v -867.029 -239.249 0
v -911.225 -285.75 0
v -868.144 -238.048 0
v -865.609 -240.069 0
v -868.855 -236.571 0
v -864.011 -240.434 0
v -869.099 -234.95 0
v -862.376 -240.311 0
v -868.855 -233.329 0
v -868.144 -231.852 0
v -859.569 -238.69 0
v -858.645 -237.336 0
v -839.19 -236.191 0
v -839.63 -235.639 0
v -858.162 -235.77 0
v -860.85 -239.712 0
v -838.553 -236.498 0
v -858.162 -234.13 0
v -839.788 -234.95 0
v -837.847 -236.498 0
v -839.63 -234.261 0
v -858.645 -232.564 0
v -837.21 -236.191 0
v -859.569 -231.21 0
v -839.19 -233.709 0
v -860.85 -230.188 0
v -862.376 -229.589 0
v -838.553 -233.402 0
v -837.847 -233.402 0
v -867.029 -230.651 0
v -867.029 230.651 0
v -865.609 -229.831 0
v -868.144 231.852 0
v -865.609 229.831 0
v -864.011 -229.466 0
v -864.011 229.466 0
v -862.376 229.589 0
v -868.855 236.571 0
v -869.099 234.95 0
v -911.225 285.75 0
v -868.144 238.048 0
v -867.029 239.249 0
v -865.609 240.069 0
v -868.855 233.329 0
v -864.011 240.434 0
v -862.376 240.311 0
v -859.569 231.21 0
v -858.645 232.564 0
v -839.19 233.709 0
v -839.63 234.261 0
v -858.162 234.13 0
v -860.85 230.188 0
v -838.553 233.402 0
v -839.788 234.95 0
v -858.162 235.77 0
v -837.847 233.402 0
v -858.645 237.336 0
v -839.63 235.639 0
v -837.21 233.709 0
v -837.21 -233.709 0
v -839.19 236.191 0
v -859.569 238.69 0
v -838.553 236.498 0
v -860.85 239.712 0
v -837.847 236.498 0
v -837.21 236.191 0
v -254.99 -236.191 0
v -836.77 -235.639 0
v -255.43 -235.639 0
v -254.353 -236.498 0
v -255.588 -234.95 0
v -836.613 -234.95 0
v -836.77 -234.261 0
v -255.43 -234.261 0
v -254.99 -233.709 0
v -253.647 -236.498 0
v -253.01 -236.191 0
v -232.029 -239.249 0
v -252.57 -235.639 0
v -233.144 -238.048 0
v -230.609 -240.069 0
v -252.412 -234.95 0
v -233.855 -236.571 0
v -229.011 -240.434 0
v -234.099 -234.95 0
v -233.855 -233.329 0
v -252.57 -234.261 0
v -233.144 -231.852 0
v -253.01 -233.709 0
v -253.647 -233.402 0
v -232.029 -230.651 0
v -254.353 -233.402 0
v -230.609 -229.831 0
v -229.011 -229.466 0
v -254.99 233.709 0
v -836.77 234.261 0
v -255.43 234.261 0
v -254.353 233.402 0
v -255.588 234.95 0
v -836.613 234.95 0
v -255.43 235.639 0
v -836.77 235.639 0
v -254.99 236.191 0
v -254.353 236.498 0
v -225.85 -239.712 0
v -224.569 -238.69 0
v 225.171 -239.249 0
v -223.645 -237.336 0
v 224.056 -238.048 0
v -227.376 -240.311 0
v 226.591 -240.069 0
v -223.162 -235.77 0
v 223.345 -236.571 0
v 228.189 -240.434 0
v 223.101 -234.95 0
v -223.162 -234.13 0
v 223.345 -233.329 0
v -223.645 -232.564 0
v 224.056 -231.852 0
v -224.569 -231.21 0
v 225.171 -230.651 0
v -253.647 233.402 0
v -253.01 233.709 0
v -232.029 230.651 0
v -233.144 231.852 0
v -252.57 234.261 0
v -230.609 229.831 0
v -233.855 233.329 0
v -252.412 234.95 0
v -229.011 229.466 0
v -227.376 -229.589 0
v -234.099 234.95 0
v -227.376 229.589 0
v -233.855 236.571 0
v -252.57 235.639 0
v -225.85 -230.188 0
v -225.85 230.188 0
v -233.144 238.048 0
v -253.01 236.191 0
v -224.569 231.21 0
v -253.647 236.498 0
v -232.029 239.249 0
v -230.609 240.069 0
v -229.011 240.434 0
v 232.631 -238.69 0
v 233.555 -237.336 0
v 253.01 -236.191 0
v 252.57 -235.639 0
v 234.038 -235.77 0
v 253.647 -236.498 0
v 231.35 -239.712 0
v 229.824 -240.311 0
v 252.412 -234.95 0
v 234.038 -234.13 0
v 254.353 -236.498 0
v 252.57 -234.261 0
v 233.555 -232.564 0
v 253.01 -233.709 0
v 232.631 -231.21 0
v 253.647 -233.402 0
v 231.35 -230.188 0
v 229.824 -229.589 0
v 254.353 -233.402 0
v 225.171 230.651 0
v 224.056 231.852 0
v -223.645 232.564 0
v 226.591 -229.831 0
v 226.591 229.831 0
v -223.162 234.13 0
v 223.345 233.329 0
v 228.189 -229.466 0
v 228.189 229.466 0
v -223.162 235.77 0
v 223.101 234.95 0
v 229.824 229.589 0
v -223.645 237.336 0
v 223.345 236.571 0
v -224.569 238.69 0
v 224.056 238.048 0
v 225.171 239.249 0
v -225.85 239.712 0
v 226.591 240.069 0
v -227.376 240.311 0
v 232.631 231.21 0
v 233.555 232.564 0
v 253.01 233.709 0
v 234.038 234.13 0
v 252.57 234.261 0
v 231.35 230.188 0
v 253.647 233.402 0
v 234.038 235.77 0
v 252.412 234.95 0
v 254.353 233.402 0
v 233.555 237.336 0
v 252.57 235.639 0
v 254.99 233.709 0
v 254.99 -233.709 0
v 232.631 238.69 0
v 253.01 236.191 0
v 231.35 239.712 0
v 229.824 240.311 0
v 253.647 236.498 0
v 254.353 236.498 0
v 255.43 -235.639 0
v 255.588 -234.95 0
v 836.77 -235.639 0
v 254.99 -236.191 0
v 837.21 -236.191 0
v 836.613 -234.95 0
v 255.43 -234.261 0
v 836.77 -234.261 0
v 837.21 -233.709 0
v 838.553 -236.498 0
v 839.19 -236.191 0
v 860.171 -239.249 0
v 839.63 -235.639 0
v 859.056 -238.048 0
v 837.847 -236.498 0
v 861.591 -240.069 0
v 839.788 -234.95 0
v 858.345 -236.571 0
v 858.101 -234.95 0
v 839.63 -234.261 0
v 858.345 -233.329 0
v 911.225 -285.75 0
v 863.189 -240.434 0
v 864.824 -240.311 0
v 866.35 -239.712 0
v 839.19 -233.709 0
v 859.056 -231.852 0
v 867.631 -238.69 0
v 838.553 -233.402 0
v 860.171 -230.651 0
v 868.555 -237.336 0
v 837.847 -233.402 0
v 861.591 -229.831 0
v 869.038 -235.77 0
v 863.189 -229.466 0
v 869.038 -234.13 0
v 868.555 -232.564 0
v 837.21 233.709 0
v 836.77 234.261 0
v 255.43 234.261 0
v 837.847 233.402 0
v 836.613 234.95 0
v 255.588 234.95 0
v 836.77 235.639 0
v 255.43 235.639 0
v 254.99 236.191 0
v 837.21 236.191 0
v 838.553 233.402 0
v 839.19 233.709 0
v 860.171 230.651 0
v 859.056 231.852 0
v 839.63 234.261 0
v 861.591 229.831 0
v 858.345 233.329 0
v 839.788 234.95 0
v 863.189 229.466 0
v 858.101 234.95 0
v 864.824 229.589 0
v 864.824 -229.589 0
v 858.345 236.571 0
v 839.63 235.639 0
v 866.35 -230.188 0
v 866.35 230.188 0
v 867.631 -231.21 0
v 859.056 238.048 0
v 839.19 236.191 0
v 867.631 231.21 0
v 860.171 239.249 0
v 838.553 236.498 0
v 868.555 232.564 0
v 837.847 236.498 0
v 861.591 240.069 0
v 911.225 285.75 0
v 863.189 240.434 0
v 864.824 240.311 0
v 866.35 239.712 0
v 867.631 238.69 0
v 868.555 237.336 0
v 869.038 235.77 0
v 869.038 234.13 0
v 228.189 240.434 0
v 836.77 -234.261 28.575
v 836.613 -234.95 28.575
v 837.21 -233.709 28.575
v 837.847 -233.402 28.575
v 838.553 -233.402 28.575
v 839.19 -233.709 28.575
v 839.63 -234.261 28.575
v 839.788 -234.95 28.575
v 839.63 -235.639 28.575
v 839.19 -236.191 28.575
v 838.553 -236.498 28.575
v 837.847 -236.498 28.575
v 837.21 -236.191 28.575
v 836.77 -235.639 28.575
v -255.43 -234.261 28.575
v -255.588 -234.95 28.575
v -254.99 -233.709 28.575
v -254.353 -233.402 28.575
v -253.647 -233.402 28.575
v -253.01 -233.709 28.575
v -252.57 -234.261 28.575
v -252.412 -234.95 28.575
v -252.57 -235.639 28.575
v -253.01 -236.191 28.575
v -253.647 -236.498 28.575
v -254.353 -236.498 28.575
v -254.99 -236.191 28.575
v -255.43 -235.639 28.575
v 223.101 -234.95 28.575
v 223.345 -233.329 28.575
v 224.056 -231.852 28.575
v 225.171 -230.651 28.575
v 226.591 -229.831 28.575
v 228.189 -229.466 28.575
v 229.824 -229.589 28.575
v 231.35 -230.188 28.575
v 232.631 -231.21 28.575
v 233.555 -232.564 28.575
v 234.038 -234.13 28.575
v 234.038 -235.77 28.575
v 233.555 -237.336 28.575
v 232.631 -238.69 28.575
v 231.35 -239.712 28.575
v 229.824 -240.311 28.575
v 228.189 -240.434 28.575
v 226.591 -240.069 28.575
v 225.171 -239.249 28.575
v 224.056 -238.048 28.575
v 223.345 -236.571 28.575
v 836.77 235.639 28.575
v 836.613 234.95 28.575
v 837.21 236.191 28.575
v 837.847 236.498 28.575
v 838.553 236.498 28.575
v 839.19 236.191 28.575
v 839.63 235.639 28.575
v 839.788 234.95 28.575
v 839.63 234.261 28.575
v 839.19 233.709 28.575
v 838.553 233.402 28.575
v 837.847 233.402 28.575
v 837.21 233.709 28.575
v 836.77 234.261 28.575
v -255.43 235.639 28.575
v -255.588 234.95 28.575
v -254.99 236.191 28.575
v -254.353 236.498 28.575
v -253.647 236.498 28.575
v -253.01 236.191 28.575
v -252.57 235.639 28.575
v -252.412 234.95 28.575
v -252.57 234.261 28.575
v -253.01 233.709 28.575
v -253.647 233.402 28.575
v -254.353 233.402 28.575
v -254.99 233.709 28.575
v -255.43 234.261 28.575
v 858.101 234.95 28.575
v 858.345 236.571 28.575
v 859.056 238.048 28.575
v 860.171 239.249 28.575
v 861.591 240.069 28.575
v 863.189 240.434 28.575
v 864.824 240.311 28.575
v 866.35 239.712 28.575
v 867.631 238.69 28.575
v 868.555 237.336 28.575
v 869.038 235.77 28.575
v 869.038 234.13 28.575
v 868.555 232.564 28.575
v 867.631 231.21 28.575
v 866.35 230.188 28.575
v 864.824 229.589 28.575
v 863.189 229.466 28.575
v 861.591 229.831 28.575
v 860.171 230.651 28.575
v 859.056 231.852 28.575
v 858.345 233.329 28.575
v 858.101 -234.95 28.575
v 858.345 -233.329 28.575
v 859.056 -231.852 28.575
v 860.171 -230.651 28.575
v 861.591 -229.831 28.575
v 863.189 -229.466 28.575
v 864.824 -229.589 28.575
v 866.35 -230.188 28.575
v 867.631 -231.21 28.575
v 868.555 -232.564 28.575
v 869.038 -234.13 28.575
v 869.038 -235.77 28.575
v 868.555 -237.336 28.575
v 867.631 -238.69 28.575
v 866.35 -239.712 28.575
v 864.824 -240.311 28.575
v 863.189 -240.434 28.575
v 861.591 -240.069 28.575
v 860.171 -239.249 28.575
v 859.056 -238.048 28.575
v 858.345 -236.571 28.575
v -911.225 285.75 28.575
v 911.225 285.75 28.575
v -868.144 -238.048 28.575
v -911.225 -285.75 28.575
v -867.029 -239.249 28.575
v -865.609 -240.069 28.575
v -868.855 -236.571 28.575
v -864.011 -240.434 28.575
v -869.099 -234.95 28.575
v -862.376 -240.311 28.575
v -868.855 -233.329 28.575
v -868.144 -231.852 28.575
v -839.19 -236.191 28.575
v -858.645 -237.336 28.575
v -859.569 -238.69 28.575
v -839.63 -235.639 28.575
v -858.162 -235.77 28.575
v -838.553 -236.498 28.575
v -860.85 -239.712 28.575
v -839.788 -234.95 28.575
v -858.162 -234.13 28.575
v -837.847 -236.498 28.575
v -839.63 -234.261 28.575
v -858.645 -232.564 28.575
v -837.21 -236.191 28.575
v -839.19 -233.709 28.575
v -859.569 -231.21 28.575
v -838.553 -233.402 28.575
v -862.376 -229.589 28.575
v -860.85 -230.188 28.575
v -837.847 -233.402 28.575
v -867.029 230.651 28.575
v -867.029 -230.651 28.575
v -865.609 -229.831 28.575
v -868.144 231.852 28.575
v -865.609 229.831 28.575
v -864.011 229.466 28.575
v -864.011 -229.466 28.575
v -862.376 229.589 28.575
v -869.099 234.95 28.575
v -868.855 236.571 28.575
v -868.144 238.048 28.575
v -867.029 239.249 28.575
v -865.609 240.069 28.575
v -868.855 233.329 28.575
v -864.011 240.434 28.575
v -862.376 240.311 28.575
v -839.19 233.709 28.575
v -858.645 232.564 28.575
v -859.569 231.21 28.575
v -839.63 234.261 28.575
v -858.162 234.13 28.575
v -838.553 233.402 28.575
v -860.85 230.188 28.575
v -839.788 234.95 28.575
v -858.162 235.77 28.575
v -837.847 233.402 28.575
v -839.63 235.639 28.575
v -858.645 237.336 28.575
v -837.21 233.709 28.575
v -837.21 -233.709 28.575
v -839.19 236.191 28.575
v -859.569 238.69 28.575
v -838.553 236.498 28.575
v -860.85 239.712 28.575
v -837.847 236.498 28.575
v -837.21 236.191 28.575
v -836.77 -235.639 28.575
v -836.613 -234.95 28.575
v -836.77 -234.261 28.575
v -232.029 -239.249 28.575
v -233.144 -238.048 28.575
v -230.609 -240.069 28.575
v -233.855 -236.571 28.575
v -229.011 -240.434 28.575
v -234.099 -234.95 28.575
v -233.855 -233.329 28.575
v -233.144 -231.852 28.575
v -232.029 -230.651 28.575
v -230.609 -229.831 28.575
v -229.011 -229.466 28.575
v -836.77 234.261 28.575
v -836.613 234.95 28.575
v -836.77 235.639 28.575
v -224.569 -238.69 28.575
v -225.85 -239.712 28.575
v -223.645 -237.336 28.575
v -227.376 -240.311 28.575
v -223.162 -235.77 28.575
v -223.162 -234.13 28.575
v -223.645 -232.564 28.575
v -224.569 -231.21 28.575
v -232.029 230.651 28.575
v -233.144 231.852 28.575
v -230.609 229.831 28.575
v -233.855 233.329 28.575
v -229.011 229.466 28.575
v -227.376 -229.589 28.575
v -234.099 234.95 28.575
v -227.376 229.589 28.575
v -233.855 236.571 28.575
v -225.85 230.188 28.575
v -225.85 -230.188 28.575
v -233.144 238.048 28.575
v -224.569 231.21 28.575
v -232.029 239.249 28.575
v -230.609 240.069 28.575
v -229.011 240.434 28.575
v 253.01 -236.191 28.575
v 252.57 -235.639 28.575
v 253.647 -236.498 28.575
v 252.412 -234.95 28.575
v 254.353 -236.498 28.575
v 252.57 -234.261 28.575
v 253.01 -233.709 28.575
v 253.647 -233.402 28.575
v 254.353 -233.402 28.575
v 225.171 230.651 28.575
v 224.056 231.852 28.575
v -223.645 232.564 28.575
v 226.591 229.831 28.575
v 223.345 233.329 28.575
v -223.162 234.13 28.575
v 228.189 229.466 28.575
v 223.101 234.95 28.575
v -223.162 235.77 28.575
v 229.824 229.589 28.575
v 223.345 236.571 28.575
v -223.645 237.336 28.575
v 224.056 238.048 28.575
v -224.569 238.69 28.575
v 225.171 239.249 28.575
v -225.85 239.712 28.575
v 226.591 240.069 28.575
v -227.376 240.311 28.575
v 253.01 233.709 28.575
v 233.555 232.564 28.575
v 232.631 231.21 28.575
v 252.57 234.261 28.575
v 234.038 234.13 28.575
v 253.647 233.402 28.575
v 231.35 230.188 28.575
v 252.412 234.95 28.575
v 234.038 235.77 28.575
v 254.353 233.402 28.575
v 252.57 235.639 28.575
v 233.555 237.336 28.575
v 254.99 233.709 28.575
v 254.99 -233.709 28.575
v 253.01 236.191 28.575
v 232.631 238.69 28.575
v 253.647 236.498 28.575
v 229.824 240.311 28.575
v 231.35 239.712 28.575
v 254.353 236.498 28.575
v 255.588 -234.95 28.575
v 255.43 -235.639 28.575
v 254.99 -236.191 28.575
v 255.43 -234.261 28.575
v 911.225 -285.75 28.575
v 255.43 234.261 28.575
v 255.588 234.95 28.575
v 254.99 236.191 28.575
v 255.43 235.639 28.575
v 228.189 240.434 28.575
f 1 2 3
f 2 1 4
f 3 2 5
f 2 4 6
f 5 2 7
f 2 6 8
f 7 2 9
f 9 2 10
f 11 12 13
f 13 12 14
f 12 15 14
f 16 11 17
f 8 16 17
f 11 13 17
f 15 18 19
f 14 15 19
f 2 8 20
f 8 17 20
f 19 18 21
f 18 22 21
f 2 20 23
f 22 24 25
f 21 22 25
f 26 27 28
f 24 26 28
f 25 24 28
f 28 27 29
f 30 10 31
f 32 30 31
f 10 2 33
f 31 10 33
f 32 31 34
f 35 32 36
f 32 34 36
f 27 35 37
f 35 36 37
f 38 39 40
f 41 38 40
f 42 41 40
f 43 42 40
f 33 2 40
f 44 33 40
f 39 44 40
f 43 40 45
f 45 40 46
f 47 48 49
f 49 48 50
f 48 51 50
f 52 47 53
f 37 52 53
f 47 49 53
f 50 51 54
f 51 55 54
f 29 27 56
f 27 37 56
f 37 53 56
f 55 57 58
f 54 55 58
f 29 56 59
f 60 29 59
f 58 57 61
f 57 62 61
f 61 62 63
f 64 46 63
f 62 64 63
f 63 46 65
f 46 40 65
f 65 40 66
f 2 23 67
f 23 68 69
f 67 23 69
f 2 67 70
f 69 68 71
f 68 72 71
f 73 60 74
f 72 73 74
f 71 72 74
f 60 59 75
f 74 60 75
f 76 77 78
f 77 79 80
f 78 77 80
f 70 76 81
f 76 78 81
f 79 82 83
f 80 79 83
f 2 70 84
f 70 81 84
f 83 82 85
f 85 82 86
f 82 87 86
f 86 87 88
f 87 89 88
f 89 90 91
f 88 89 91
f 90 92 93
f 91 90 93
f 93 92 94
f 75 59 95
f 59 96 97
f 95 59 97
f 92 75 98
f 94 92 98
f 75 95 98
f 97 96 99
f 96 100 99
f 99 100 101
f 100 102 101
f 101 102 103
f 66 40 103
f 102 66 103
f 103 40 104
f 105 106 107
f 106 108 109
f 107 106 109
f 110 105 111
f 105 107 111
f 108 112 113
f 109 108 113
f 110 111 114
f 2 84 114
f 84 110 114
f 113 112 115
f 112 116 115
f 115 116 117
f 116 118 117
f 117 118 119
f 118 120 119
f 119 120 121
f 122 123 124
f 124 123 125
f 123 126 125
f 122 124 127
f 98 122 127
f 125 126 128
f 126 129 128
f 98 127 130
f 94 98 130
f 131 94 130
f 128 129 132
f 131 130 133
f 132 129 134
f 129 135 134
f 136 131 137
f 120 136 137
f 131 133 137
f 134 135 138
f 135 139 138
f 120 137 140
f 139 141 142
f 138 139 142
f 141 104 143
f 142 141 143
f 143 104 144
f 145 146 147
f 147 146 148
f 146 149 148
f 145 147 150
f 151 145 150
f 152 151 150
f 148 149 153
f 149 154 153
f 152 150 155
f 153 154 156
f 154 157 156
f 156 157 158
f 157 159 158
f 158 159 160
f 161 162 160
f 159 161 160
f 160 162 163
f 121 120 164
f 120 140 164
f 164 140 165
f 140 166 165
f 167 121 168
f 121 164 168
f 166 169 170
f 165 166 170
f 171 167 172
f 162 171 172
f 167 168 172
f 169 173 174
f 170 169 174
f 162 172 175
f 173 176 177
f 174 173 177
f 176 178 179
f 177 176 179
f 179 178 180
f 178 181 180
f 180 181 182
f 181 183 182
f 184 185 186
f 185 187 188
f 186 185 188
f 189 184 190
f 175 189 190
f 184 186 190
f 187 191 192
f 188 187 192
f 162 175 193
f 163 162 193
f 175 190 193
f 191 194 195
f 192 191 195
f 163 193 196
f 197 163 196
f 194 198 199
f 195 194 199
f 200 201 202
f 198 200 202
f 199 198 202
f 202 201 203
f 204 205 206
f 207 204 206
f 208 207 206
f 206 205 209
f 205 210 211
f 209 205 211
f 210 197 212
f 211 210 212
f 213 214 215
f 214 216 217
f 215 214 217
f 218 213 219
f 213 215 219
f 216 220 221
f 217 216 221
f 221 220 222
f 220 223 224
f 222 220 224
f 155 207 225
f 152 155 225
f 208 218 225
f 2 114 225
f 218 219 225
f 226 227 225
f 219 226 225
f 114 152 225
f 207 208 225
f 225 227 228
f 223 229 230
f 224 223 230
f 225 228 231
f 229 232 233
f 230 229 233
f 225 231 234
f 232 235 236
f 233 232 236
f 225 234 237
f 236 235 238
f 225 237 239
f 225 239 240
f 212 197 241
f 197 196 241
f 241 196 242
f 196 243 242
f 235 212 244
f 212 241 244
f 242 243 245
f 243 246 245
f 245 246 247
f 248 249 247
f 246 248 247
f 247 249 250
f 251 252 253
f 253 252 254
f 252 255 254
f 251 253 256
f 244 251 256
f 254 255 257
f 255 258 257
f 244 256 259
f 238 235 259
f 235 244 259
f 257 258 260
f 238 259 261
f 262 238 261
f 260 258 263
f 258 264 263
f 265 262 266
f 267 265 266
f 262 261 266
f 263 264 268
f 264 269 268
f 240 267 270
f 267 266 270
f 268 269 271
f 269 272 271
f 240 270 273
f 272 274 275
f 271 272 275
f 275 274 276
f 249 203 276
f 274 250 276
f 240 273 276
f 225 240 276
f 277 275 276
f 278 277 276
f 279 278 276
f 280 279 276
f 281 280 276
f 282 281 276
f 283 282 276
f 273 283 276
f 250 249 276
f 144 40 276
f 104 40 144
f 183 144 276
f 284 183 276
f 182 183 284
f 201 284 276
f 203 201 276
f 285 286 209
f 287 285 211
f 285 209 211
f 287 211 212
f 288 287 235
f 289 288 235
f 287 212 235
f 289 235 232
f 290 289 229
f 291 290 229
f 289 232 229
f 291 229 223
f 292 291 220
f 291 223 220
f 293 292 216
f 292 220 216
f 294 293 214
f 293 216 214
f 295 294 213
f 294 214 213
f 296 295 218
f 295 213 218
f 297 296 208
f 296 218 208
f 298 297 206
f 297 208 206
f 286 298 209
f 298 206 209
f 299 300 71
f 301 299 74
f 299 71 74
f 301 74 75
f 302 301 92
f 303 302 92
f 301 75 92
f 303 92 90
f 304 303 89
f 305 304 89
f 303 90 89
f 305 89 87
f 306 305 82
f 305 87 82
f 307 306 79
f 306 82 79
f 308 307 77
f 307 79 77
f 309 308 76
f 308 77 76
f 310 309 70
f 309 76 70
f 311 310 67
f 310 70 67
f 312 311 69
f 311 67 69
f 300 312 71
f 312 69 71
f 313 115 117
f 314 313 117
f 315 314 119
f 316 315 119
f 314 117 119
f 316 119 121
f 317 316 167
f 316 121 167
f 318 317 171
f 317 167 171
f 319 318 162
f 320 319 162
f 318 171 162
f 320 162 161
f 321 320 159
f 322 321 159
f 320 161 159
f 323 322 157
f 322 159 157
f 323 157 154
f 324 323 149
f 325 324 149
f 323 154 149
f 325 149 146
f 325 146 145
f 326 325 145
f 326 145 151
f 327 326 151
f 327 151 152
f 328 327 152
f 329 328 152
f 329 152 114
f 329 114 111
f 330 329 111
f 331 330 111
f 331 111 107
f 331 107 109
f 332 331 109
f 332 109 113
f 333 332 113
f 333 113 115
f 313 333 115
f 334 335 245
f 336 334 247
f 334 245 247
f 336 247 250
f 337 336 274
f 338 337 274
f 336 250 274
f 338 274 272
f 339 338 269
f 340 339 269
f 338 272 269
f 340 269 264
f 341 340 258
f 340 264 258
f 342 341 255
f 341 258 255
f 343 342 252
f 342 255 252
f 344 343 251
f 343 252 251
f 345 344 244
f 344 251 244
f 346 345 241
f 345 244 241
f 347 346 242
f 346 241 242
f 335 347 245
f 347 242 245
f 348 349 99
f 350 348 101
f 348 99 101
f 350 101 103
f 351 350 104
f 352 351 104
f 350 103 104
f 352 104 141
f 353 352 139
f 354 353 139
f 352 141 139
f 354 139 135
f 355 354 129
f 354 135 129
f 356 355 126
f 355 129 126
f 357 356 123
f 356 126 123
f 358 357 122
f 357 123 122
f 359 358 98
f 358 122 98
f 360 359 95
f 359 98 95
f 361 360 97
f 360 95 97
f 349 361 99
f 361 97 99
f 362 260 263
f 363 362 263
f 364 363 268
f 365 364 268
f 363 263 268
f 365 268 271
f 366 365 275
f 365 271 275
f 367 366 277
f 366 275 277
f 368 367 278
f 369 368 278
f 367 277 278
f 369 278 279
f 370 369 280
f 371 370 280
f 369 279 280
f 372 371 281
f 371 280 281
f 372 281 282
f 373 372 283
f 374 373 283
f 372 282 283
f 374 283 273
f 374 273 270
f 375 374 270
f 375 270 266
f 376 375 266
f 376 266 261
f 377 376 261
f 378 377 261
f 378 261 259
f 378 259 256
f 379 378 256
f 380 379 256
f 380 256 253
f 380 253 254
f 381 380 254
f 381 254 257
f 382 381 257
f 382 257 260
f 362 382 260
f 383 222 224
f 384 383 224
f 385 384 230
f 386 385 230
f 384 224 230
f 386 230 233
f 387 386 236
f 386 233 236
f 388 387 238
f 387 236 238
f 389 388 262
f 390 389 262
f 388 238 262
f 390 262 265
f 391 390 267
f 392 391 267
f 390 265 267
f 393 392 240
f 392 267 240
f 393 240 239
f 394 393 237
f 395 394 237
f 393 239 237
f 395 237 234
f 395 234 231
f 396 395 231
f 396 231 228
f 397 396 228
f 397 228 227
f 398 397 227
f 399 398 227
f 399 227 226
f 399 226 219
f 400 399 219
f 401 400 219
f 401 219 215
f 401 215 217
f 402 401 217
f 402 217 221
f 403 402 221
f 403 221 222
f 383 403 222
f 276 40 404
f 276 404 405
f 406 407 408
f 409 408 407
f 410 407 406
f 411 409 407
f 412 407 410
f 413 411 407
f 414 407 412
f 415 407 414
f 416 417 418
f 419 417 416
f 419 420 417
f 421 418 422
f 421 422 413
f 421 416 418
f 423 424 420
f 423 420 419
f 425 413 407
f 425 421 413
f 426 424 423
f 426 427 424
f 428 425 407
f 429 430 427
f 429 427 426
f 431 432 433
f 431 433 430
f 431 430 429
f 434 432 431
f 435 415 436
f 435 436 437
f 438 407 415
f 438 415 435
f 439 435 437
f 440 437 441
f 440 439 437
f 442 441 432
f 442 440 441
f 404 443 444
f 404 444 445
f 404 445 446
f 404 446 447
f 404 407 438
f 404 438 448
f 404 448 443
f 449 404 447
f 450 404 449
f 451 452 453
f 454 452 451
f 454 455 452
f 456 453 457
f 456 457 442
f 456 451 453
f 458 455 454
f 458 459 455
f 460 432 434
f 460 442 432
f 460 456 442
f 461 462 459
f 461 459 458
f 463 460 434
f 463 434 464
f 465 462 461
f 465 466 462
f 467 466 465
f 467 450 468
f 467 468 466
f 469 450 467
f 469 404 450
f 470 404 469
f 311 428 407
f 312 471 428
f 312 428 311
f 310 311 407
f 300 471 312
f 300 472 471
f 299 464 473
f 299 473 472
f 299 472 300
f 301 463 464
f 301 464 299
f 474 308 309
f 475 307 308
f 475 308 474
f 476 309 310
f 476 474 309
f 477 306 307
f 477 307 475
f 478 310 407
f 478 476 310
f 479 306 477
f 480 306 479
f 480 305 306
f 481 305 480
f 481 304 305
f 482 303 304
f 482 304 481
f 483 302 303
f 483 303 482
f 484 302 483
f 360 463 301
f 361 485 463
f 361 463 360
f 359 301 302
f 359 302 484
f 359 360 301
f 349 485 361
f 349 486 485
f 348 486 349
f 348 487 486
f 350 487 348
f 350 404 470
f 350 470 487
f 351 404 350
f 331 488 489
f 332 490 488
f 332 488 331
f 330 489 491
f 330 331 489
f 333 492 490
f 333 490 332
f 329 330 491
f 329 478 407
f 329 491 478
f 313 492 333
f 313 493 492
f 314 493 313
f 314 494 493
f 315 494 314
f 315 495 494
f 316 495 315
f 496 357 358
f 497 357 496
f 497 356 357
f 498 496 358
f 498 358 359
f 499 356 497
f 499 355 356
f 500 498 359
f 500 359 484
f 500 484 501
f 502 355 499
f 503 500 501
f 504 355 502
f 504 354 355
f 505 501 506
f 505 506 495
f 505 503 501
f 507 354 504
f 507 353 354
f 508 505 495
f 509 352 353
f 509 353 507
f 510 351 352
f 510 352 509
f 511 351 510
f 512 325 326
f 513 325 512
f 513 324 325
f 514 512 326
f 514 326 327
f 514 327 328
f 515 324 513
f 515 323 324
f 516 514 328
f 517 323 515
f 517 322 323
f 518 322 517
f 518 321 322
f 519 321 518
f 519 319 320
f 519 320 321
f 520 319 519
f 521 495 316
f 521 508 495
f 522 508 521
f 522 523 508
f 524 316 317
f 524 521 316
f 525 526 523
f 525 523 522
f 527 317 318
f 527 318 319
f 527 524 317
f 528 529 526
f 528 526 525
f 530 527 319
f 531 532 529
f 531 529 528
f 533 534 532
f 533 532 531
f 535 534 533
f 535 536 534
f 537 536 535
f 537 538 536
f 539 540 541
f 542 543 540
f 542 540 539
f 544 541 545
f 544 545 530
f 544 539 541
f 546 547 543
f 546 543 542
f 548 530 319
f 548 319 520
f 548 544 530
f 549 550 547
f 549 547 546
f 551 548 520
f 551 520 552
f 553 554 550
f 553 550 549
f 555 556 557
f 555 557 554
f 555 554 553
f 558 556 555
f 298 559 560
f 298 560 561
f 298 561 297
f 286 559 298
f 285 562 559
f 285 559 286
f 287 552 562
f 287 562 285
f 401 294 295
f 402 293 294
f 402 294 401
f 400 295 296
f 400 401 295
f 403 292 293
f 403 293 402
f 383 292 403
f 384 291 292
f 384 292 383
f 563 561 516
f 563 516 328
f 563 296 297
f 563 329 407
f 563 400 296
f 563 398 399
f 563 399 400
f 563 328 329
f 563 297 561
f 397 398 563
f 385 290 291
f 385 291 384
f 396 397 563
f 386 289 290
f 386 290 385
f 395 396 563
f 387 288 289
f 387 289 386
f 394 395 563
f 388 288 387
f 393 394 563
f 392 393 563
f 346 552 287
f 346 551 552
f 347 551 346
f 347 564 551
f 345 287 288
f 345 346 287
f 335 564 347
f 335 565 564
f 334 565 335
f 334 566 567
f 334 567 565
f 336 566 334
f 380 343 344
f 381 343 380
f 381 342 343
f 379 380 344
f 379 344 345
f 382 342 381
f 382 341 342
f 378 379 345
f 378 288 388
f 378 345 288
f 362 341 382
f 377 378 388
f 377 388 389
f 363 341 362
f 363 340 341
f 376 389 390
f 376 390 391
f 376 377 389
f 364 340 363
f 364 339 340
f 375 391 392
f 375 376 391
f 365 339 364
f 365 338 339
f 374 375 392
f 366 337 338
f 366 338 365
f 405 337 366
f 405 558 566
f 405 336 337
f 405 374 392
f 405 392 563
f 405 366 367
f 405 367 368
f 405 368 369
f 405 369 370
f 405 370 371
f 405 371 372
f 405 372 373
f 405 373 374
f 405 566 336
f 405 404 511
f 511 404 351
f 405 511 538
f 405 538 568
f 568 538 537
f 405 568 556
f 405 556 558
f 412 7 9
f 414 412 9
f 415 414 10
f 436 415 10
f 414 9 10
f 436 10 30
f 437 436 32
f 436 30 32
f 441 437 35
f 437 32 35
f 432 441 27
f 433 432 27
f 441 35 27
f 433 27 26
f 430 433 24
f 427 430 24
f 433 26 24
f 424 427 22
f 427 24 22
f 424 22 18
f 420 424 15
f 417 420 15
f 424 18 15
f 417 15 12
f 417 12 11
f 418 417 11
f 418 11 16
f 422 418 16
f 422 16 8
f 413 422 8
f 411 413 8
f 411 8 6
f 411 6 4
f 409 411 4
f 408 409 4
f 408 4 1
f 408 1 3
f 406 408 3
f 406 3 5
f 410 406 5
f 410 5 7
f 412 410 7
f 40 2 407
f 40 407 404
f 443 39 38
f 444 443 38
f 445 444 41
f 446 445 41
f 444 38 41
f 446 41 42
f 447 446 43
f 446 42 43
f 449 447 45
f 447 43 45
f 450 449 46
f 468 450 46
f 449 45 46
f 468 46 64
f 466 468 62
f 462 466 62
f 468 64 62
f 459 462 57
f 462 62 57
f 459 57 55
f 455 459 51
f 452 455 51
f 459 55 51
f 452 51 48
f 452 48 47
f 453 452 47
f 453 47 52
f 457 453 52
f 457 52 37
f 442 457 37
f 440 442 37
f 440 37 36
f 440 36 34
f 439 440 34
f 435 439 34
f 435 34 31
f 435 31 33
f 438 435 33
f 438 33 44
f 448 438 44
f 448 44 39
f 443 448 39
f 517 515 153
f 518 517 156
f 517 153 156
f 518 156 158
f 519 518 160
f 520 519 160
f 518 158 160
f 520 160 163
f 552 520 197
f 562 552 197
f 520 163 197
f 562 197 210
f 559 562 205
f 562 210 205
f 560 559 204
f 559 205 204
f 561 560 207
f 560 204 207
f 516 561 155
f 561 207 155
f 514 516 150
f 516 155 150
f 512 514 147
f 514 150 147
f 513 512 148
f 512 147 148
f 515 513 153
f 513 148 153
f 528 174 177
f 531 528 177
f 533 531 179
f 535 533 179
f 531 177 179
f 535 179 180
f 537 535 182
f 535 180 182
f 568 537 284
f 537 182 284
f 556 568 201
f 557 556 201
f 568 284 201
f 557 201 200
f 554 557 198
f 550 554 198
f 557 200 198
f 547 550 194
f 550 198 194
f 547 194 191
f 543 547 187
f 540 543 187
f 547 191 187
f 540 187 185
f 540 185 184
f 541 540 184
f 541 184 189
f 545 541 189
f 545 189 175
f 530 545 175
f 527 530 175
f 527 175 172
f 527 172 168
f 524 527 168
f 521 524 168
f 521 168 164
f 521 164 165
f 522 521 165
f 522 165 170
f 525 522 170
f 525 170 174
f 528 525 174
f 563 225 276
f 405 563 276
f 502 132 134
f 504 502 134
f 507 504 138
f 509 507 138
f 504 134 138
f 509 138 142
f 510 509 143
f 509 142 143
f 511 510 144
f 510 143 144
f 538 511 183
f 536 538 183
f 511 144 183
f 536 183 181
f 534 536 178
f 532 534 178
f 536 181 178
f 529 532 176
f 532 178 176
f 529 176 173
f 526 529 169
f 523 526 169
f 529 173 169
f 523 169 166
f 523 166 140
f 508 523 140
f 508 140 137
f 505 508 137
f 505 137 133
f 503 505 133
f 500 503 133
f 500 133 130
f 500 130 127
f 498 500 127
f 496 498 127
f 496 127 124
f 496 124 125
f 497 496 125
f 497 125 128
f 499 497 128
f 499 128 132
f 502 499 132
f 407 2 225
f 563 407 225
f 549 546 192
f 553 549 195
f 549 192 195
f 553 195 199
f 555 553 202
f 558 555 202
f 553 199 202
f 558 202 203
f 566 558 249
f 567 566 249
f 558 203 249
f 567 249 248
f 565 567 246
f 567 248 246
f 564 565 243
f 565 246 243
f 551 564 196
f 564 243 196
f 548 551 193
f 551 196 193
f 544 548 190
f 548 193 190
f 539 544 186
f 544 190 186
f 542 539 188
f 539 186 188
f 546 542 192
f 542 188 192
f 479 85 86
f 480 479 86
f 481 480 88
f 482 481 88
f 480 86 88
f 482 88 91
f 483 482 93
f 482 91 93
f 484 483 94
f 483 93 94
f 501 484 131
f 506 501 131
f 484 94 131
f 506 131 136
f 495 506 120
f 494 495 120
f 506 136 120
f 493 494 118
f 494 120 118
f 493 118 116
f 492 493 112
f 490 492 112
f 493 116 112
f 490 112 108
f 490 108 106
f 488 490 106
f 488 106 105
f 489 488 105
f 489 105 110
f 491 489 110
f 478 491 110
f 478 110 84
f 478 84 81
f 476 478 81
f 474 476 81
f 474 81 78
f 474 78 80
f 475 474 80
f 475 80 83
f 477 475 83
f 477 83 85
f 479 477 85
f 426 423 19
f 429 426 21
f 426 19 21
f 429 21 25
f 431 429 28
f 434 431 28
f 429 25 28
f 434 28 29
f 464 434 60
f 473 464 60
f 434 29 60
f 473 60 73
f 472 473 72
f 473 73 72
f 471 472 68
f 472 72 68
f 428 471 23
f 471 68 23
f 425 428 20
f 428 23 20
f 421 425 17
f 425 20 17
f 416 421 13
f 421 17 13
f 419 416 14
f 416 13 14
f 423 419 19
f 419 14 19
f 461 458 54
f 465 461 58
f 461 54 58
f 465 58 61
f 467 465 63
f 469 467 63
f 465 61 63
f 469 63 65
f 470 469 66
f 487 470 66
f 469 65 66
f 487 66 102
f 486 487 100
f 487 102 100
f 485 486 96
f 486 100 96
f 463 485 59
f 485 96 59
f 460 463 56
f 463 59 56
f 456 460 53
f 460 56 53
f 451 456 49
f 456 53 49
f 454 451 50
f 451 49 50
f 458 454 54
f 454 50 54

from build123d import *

# Parameters (mm, degrees)
F0_W     = 1822.45
F0_H     = 571.5
F1_DEPTH = 28.575
F3_D     = 10.9982
F3_DEPTH = 31.75
F4_D     = 3.175
F4_DEPTH = 31.75


with BuildPart() as f1:
    # F0 (on Top) → F1 (new body)
    with BuildSketch(Plane.XY):
        Rectangle(F0_W, F0_H)
    extrude(amount=F1_DEPTH)

    # F3
    with Locations(Plane.XY.offset(28.575)):
        with Locations((-863.6, 234.95), (-863.6, -234.95), (-228.6, -234.95), (-228.6, 234.95), (228.6, 234.95), (228.6, -234.95), (863.6, 234.95), (863.6, -234.95)):
            Hole(F3_D / 2, depth=F3_DEPTH)

    # F4
    with Locations(Plane.XY.offset(28.575)):
        with Locations((-838.2, 234.95), (-254, 234.95), (254, 234.95), (838.2, 234.95), (838.2, -234.95), (254, -234.95), (-254, -234.95), (-838.2, -234.95)):
            Hole(F4_D / 2, depth=F4_DEPTH)


solid = f1.part
